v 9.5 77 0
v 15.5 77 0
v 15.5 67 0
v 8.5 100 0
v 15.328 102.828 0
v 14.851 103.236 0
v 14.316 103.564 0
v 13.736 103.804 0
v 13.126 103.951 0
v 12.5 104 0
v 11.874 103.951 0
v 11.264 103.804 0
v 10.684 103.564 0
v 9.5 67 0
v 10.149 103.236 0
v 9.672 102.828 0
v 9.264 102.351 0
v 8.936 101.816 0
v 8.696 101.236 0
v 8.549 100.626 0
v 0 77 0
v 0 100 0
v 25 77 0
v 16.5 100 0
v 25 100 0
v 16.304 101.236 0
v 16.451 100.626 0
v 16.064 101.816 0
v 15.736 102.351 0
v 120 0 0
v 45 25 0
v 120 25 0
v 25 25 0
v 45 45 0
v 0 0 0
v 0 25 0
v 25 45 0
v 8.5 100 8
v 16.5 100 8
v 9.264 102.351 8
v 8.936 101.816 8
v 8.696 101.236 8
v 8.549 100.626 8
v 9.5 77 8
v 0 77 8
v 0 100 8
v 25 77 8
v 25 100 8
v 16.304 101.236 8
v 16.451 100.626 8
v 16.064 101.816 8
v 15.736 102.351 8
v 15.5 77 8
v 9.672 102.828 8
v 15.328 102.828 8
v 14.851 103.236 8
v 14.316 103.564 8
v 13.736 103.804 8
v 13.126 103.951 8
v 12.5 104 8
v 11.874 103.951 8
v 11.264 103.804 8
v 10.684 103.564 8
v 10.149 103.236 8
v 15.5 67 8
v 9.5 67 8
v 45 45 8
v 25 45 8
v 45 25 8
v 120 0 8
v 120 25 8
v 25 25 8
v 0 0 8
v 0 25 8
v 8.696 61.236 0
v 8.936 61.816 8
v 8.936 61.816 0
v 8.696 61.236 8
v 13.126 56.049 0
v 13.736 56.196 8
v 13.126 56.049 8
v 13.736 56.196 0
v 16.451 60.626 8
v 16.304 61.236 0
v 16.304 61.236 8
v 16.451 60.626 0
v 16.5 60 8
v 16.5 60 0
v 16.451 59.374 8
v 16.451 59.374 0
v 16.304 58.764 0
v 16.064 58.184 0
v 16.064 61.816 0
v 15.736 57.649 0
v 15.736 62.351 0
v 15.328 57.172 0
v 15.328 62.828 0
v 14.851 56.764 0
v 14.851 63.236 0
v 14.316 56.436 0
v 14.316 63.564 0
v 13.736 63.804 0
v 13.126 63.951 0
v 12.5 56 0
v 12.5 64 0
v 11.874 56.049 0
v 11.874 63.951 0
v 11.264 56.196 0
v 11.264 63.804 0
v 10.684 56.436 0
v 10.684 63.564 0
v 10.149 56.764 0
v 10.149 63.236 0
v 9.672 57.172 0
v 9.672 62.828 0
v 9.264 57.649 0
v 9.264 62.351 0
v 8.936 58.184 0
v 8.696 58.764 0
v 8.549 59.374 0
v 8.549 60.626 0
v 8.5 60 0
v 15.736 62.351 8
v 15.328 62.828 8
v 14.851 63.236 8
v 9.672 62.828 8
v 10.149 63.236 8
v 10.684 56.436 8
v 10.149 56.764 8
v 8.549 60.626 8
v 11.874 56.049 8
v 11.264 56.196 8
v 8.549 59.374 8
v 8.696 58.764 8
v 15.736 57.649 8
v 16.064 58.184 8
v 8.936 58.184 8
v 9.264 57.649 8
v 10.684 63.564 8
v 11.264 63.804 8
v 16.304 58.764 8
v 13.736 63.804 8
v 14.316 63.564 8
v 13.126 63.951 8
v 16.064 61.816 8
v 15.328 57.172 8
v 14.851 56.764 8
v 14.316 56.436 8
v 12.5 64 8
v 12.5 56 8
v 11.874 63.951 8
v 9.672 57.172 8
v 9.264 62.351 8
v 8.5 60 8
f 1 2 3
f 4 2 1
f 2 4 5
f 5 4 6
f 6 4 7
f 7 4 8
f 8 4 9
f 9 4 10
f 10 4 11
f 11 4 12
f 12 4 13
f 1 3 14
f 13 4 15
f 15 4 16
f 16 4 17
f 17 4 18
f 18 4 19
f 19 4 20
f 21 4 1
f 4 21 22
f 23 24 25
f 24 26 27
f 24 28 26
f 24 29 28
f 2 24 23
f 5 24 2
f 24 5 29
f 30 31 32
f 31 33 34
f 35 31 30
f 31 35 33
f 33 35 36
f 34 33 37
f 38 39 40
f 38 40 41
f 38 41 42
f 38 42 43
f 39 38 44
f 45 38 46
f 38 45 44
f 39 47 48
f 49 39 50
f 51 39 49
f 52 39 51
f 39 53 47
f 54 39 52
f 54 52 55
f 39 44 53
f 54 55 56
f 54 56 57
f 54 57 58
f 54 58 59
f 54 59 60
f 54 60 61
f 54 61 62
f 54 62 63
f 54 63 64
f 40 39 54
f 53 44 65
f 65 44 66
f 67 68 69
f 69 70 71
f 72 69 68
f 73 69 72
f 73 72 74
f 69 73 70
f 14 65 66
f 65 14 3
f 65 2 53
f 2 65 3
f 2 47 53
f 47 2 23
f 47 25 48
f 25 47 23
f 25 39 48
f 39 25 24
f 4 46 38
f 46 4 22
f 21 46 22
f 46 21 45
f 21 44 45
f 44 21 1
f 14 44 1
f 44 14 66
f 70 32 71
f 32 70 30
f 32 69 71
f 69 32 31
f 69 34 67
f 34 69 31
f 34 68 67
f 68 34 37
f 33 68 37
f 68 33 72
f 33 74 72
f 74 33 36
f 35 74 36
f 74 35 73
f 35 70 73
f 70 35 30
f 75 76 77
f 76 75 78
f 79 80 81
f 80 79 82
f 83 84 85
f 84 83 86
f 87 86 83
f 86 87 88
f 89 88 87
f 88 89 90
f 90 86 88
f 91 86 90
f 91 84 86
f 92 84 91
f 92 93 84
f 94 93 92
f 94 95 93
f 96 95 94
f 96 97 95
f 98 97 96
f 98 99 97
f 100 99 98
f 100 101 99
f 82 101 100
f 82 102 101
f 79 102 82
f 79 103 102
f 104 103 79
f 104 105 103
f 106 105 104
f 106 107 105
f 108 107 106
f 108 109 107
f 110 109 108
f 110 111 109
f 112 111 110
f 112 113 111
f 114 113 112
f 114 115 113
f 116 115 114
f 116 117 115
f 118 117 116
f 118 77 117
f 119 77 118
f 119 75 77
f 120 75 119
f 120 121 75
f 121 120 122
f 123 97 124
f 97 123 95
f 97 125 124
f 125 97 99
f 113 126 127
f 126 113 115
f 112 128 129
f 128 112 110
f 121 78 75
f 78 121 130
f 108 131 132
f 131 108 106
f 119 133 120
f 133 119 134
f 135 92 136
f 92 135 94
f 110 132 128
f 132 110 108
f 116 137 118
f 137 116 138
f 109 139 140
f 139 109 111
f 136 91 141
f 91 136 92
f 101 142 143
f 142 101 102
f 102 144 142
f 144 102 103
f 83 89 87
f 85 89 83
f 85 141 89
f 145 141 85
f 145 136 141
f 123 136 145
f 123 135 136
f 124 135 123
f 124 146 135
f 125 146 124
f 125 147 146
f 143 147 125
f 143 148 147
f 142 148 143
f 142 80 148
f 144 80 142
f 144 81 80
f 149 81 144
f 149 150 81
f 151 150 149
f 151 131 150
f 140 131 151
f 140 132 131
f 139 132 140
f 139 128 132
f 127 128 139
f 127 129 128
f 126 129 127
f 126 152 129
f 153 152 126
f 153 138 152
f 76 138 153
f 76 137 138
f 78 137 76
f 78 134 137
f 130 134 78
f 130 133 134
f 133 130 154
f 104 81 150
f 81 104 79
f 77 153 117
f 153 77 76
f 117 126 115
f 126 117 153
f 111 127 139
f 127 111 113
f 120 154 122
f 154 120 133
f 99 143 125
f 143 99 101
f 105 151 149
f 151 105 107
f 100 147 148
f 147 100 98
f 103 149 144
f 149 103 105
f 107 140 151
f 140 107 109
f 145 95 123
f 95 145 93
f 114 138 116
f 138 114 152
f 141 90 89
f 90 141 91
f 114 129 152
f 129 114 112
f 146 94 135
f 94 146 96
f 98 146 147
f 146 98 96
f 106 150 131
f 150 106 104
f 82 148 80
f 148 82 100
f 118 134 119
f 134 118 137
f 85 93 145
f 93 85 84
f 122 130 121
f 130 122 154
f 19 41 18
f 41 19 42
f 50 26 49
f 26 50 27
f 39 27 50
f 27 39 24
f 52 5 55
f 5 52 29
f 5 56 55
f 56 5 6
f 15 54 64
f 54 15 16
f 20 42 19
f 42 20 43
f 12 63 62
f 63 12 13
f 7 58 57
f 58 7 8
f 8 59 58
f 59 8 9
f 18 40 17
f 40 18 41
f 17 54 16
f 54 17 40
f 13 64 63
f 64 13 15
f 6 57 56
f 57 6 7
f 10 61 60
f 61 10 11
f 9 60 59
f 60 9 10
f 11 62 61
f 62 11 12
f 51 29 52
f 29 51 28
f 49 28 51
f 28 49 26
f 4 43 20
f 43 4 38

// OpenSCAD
module poly_extrude(h, l_scale = 1) {
    linear_extrude(height = h, scale = l_scale) {
        polygon(points);
    }
}

points = [
    [0, 0], [120, 0], [120, 25], [45, 25], [45, 45], [25, 45], [25, 25], [0, 25],
    [0, 100], [25, 100], [25, 77], [15.5, 77], [15.5, 67], [9.5, 67], [9.5, 77], [0, 77]
];

poly_extrude(8, 1) {
    polygon(points);
}

translate([20, 12.5, 0]) {
    cylinder(h = 8, r = 5, $fn = 40);
}

translate([60, 12.5, 0]) {
    cylinder(h = 8, r = 5, $fn = 40);
}

translate([100, 12.5, 0]) {
    cylinder(h = 8, r = 5, $fn = 40);
}

translate([12.5, 20, 0]) {
    cylinder(h = 8, r = 4, $fn = 40);
}

translate([12.5, 60, 0]) {
    cylinder(h = 8, r = 4, $fn = 40);
}

translate([12.5, 100, 0]) {
    cylinder(h = 8, r = 4, $fn = 40);
}
